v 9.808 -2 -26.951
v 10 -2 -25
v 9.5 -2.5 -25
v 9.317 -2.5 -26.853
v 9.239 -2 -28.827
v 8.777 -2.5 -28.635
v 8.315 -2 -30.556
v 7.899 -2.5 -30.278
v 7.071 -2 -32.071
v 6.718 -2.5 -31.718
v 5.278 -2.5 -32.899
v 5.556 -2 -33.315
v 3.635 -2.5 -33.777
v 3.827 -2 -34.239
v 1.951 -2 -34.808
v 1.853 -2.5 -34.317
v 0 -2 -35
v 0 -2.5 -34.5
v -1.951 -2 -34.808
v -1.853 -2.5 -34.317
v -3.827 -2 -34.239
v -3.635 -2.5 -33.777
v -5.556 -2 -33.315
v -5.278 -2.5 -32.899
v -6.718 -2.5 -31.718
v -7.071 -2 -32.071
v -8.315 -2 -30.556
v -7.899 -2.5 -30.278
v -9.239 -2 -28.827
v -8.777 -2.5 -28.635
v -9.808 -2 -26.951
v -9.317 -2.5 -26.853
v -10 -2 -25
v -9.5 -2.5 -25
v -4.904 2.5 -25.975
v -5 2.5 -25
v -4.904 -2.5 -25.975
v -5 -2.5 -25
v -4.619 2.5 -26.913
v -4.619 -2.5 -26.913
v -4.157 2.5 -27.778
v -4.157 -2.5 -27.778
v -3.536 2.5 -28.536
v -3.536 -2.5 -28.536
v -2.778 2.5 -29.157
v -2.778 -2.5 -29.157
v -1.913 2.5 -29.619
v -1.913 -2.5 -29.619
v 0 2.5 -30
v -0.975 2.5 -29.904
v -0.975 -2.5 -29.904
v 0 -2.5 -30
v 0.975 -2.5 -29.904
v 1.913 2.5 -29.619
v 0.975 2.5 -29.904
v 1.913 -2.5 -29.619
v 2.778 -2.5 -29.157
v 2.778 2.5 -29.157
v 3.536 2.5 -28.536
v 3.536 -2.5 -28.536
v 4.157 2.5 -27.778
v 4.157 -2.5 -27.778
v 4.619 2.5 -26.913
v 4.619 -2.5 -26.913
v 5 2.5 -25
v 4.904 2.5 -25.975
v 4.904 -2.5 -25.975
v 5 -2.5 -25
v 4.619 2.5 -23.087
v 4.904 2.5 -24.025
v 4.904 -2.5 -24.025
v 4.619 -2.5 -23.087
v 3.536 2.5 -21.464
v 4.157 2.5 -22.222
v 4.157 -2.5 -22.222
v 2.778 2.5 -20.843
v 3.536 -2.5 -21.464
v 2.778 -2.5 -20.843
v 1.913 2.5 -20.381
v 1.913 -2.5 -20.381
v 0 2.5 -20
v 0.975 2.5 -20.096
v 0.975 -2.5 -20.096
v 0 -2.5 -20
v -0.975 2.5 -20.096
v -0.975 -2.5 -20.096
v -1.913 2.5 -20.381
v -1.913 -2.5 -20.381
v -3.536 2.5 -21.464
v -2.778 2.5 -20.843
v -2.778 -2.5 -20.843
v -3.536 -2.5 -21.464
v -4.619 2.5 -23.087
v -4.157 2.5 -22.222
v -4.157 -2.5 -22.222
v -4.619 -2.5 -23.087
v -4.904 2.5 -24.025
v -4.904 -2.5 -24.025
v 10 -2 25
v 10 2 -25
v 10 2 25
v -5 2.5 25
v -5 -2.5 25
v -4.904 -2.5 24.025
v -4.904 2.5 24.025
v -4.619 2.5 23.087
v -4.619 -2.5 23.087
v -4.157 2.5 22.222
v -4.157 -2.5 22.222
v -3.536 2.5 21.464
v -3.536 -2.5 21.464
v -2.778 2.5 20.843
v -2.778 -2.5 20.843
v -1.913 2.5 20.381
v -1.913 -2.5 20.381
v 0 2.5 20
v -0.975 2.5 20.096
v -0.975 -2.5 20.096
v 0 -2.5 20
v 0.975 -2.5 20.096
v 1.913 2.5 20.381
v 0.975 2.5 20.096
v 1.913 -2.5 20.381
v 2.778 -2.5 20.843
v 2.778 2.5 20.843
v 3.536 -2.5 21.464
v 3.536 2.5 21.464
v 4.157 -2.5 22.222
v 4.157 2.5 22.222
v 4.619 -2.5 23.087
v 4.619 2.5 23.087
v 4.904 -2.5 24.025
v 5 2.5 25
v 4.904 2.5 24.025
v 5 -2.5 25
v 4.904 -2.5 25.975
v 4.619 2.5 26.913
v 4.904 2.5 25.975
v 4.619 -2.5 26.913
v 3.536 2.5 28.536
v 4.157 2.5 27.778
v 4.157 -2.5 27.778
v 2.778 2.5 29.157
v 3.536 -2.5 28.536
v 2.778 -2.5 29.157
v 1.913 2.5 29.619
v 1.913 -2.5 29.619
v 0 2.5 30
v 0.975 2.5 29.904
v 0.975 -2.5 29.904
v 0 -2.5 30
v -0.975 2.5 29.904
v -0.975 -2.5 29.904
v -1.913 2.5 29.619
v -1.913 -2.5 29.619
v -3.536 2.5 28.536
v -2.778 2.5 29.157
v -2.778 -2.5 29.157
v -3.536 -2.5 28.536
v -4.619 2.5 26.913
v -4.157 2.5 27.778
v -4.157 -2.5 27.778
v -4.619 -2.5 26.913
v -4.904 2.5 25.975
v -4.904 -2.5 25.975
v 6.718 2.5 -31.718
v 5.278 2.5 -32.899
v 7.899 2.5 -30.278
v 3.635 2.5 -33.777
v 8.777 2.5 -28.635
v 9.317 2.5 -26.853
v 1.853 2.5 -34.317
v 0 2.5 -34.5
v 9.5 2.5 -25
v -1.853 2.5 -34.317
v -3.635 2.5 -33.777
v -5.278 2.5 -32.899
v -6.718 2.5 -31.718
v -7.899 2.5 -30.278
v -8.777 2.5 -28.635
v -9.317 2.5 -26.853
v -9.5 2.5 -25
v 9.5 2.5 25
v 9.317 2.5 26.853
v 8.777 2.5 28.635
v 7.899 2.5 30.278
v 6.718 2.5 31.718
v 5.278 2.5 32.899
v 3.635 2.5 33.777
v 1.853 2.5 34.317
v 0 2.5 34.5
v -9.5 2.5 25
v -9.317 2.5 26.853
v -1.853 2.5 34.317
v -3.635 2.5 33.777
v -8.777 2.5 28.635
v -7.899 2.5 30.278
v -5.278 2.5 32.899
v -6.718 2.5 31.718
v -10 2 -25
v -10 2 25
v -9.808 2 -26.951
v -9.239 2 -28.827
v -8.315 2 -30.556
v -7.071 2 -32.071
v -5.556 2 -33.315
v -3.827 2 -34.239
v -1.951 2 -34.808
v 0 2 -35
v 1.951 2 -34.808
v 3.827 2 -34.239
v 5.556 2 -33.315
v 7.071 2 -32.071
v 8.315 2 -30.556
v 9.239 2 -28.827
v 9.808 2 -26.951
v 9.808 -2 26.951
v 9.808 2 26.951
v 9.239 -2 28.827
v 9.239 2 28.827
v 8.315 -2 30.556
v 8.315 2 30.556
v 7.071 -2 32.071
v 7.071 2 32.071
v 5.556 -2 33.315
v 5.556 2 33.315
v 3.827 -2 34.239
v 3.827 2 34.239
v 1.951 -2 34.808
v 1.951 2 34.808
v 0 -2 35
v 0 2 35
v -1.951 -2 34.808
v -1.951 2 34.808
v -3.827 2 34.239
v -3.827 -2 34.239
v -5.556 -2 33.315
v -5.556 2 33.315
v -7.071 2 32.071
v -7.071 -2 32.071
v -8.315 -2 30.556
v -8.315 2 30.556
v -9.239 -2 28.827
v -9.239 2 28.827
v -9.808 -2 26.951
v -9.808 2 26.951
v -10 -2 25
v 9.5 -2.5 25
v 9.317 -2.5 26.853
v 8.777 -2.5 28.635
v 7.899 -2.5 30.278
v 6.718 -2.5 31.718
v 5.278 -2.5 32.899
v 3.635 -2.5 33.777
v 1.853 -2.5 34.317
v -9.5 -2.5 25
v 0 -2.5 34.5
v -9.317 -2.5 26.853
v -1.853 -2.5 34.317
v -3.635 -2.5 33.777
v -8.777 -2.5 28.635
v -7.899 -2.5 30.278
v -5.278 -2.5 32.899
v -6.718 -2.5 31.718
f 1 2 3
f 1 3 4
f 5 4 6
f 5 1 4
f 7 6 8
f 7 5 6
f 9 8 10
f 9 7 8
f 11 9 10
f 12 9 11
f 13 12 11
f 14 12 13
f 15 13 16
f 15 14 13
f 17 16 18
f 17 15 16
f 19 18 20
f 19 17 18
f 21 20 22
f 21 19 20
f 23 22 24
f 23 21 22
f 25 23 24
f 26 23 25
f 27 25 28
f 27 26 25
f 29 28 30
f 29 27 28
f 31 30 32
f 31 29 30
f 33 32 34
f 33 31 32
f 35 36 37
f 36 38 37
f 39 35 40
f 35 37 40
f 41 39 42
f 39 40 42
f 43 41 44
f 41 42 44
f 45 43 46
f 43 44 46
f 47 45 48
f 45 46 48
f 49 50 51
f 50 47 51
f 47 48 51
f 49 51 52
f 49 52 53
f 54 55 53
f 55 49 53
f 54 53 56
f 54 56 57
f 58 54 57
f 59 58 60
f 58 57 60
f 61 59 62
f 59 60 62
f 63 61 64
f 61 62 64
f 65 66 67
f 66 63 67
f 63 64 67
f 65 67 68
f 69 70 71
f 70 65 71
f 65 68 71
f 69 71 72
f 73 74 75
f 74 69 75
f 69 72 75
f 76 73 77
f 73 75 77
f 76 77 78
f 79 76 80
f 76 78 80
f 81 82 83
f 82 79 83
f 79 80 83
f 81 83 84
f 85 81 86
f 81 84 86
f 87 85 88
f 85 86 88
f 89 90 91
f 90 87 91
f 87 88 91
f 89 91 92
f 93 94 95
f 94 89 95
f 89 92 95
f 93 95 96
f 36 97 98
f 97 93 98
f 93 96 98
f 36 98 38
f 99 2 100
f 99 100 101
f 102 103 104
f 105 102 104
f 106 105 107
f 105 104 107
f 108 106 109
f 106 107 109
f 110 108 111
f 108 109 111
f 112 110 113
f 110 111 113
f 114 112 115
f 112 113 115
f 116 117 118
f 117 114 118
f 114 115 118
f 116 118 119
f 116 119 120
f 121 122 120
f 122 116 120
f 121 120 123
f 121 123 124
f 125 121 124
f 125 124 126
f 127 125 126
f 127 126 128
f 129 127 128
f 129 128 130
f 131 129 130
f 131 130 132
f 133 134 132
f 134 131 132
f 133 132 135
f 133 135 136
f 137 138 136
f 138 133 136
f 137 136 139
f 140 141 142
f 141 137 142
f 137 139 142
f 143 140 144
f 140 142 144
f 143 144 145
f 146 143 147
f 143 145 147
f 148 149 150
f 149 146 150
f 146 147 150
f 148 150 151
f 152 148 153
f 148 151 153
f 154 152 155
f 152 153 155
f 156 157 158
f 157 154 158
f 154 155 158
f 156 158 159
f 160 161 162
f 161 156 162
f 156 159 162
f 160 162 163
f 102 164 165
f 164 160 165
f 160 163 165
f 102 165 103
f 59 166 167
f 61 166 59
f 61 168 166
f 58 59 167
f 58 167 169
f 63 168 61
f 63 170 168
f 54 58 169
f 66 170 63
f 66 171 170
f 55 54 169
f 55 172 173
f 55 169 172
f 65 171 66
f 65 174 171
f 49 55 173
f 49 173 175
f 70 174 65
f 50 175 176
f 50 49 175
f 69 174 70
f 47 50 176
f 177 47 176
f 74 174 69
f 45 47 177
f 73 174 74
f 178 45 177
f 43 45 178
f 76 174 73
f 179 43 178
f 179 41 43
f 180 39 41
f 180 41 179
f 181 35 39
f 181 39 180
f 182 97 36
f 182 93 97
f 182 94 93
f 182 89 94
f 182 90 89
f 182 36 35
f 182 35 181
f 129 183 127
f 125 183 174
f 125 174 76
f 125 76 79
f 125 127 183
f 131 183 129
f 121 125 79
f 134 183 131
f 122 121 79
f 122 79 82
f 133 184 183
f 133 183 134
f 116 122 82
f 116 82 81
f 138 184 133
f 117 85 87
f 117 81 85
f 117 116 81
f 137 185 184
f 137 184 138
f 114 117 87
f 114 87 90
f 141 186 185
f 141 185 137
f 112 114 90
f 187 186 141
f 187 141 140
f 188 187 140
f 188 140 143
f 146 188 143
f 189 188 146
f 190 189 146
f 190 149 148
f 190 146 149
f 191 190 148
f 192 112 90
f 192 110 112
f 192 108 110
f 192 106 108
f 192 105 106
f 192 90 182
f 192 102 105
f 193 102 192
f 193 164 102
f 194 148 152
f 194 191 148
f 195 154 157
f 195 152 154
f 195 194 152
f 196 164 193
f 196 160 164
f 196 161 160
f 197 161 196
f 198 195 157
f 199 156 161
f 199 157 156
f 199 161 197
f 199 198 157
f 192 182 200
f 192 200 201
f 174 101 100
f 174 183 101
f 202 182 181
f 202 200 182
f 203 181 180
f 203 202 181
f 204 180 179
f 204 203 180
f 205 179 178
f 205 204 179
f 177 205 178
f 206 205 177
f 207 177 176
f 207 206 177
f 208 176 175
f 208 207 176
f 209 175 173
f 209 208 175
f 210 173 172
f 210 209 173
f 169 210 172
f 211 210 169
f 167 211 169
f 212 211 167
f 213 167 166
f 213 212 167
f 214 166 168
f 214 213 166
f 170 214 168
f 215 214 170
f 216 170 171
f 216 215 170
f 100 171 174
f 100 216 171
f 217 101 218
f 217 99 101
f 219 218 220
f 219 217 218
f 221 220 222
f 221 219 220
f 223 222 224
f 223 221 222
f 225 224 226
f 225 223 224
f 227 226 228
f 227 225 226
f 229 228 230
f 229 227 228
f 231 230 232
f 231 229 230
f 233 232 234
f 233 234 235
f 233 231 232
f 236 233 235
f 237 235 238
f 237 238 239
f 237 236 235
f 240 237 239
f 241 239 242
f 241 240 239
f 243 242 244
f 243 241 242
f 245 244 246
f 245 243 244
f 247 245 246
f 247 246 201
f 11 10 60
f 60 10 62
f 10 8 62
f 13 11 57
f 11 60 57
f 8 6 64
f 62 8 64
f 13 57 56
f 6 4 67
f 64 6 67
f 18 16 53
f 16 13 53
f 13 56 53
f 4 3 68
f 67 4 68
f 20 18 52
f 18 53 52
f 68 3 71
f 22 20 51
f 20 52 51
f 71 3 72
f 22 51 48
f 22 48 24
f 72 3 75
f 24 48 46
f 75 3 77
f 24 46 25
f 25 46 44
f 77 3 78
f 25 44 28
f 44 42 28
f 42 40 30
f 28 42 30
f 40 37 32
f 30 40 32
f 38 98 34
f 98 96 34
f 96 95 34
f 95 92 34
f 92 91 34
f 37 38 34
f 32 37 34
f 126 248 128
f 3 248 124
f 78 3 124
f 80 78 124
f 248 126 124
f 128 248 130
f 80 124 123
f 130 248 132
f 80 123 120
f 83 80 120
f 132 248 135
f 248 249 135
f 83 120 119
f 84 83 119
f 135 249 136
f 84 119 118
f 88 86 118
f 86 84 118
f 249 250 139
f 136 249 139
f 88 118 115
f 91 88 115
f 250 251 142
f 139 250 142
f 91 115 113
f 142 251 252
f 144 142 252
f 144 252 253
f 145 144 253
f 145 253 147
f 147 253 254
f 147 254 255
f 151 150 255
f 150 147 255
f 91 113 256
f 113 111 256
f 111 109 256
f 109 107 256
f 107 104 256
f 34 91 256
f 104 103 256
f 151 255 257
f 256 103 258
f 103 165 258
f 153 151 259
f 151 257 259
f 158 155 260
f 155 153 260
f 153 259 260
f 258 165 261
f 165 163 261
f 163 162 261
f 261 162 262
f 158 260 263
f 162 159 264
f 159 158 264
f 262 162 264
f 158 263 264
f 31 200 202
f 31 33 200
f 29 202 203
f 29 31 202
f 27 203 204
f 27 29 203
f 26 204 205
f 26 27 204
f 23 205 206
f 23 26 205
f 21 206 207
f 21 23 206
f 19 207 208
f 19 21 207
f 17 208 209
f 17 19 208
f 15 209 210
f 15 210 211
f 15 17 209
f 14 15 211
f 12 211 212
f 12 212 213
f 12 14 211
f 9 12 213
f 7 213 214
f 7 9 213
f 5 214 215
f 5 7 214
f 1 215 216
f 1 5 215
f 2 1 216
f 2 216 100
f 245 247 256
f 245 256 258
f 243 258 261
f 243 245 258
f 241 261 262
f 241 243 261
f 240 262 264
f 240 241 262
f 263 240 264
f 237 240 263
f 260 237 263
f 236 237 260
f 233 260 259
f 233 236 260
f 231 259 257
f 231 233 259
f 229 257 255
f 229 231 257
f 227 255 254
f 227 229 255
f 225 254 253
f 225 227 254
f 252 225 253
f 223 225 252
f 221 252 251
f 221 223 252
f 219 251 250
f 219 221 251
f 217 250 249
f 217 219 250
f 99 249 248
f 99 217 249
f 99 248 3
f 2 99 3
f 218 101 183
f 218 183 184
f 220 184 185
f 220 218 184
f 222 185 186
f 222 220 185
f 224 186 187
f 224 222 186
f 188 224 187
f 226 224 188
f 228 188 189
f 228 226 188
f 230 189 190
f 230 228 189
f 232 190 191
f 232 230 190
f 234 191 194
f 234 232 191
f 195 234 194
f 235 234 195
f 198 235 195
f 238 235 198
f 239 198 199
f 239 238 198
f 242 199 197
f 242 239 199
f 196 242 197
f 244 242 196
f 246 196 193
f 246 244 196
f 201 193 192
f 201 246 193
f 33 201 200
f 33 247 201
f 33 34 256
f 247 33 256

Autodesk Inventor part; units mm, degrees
ref_plane "YZ Plane" through (0, 0, 0) normal (1, 0, 0) x (0, 1, 0)
ref_plane "XZ Plane" through (0, 0, 0) normal (0, 1, 0) x (-1, 0, 0)
ref_plane "XY Plane" through (0, 0, 0) normal (0, 0, 1) x (1, 0, 0)
sketch "Sketch1" plane through (0, 0, 0) normal (0, 1, 0) x (-1, 0, 0)
  circle A0 centre (0, 25) radius 5
  arc A1 (10, 25) -> (-10, 25) centre (0, 25) ccw
  arc A2 (-10, -25) -> (10, -25) centre (0, -25) ccw
  circle A3 centre (0, -25) radius 5
  line L0 (10, 25) -> (10, -25)
  line L1 (-10, -25) -> (-10, 25)
  line L2 (10, 25) -> (10, 35)
  line L3 (-10, 25) -> (-10, 35)
  line L4 (-10, 35) -> (10, 35)
  line L5 (-10, -25) -> (-10, -35)
  line L6 (-10, -35) -> (10, -35)
  line L7 (10, -35) -> (10, -25)
  point P0 (0, 0)
  point P1 (10, 0)
  point P2 (0, -35)
  point P3 (0, 35)
  dimension "d0" = 50
  dimension "d1" = 10
  dimension "d2" = 20
extrude "Extrusion1" add sketch "Sketch1" along normal mid plane 5 contours L0 A2 L1 A1
extrude "Extrusion2" [suppressed]
chamfer "Chamfer1" distance 0.5 angle 45 8 edges at (-10, -2.5, 0) (0, -2.5, -35) (0, -2.5, 35) (10, -2.5, 0) (-10, 2.5, 0) (0, 2.5, 35) (10, 2.5, 0) (0, 2.5, -35)
properties part number "LINK" material "Aluminium 6082 T6"
